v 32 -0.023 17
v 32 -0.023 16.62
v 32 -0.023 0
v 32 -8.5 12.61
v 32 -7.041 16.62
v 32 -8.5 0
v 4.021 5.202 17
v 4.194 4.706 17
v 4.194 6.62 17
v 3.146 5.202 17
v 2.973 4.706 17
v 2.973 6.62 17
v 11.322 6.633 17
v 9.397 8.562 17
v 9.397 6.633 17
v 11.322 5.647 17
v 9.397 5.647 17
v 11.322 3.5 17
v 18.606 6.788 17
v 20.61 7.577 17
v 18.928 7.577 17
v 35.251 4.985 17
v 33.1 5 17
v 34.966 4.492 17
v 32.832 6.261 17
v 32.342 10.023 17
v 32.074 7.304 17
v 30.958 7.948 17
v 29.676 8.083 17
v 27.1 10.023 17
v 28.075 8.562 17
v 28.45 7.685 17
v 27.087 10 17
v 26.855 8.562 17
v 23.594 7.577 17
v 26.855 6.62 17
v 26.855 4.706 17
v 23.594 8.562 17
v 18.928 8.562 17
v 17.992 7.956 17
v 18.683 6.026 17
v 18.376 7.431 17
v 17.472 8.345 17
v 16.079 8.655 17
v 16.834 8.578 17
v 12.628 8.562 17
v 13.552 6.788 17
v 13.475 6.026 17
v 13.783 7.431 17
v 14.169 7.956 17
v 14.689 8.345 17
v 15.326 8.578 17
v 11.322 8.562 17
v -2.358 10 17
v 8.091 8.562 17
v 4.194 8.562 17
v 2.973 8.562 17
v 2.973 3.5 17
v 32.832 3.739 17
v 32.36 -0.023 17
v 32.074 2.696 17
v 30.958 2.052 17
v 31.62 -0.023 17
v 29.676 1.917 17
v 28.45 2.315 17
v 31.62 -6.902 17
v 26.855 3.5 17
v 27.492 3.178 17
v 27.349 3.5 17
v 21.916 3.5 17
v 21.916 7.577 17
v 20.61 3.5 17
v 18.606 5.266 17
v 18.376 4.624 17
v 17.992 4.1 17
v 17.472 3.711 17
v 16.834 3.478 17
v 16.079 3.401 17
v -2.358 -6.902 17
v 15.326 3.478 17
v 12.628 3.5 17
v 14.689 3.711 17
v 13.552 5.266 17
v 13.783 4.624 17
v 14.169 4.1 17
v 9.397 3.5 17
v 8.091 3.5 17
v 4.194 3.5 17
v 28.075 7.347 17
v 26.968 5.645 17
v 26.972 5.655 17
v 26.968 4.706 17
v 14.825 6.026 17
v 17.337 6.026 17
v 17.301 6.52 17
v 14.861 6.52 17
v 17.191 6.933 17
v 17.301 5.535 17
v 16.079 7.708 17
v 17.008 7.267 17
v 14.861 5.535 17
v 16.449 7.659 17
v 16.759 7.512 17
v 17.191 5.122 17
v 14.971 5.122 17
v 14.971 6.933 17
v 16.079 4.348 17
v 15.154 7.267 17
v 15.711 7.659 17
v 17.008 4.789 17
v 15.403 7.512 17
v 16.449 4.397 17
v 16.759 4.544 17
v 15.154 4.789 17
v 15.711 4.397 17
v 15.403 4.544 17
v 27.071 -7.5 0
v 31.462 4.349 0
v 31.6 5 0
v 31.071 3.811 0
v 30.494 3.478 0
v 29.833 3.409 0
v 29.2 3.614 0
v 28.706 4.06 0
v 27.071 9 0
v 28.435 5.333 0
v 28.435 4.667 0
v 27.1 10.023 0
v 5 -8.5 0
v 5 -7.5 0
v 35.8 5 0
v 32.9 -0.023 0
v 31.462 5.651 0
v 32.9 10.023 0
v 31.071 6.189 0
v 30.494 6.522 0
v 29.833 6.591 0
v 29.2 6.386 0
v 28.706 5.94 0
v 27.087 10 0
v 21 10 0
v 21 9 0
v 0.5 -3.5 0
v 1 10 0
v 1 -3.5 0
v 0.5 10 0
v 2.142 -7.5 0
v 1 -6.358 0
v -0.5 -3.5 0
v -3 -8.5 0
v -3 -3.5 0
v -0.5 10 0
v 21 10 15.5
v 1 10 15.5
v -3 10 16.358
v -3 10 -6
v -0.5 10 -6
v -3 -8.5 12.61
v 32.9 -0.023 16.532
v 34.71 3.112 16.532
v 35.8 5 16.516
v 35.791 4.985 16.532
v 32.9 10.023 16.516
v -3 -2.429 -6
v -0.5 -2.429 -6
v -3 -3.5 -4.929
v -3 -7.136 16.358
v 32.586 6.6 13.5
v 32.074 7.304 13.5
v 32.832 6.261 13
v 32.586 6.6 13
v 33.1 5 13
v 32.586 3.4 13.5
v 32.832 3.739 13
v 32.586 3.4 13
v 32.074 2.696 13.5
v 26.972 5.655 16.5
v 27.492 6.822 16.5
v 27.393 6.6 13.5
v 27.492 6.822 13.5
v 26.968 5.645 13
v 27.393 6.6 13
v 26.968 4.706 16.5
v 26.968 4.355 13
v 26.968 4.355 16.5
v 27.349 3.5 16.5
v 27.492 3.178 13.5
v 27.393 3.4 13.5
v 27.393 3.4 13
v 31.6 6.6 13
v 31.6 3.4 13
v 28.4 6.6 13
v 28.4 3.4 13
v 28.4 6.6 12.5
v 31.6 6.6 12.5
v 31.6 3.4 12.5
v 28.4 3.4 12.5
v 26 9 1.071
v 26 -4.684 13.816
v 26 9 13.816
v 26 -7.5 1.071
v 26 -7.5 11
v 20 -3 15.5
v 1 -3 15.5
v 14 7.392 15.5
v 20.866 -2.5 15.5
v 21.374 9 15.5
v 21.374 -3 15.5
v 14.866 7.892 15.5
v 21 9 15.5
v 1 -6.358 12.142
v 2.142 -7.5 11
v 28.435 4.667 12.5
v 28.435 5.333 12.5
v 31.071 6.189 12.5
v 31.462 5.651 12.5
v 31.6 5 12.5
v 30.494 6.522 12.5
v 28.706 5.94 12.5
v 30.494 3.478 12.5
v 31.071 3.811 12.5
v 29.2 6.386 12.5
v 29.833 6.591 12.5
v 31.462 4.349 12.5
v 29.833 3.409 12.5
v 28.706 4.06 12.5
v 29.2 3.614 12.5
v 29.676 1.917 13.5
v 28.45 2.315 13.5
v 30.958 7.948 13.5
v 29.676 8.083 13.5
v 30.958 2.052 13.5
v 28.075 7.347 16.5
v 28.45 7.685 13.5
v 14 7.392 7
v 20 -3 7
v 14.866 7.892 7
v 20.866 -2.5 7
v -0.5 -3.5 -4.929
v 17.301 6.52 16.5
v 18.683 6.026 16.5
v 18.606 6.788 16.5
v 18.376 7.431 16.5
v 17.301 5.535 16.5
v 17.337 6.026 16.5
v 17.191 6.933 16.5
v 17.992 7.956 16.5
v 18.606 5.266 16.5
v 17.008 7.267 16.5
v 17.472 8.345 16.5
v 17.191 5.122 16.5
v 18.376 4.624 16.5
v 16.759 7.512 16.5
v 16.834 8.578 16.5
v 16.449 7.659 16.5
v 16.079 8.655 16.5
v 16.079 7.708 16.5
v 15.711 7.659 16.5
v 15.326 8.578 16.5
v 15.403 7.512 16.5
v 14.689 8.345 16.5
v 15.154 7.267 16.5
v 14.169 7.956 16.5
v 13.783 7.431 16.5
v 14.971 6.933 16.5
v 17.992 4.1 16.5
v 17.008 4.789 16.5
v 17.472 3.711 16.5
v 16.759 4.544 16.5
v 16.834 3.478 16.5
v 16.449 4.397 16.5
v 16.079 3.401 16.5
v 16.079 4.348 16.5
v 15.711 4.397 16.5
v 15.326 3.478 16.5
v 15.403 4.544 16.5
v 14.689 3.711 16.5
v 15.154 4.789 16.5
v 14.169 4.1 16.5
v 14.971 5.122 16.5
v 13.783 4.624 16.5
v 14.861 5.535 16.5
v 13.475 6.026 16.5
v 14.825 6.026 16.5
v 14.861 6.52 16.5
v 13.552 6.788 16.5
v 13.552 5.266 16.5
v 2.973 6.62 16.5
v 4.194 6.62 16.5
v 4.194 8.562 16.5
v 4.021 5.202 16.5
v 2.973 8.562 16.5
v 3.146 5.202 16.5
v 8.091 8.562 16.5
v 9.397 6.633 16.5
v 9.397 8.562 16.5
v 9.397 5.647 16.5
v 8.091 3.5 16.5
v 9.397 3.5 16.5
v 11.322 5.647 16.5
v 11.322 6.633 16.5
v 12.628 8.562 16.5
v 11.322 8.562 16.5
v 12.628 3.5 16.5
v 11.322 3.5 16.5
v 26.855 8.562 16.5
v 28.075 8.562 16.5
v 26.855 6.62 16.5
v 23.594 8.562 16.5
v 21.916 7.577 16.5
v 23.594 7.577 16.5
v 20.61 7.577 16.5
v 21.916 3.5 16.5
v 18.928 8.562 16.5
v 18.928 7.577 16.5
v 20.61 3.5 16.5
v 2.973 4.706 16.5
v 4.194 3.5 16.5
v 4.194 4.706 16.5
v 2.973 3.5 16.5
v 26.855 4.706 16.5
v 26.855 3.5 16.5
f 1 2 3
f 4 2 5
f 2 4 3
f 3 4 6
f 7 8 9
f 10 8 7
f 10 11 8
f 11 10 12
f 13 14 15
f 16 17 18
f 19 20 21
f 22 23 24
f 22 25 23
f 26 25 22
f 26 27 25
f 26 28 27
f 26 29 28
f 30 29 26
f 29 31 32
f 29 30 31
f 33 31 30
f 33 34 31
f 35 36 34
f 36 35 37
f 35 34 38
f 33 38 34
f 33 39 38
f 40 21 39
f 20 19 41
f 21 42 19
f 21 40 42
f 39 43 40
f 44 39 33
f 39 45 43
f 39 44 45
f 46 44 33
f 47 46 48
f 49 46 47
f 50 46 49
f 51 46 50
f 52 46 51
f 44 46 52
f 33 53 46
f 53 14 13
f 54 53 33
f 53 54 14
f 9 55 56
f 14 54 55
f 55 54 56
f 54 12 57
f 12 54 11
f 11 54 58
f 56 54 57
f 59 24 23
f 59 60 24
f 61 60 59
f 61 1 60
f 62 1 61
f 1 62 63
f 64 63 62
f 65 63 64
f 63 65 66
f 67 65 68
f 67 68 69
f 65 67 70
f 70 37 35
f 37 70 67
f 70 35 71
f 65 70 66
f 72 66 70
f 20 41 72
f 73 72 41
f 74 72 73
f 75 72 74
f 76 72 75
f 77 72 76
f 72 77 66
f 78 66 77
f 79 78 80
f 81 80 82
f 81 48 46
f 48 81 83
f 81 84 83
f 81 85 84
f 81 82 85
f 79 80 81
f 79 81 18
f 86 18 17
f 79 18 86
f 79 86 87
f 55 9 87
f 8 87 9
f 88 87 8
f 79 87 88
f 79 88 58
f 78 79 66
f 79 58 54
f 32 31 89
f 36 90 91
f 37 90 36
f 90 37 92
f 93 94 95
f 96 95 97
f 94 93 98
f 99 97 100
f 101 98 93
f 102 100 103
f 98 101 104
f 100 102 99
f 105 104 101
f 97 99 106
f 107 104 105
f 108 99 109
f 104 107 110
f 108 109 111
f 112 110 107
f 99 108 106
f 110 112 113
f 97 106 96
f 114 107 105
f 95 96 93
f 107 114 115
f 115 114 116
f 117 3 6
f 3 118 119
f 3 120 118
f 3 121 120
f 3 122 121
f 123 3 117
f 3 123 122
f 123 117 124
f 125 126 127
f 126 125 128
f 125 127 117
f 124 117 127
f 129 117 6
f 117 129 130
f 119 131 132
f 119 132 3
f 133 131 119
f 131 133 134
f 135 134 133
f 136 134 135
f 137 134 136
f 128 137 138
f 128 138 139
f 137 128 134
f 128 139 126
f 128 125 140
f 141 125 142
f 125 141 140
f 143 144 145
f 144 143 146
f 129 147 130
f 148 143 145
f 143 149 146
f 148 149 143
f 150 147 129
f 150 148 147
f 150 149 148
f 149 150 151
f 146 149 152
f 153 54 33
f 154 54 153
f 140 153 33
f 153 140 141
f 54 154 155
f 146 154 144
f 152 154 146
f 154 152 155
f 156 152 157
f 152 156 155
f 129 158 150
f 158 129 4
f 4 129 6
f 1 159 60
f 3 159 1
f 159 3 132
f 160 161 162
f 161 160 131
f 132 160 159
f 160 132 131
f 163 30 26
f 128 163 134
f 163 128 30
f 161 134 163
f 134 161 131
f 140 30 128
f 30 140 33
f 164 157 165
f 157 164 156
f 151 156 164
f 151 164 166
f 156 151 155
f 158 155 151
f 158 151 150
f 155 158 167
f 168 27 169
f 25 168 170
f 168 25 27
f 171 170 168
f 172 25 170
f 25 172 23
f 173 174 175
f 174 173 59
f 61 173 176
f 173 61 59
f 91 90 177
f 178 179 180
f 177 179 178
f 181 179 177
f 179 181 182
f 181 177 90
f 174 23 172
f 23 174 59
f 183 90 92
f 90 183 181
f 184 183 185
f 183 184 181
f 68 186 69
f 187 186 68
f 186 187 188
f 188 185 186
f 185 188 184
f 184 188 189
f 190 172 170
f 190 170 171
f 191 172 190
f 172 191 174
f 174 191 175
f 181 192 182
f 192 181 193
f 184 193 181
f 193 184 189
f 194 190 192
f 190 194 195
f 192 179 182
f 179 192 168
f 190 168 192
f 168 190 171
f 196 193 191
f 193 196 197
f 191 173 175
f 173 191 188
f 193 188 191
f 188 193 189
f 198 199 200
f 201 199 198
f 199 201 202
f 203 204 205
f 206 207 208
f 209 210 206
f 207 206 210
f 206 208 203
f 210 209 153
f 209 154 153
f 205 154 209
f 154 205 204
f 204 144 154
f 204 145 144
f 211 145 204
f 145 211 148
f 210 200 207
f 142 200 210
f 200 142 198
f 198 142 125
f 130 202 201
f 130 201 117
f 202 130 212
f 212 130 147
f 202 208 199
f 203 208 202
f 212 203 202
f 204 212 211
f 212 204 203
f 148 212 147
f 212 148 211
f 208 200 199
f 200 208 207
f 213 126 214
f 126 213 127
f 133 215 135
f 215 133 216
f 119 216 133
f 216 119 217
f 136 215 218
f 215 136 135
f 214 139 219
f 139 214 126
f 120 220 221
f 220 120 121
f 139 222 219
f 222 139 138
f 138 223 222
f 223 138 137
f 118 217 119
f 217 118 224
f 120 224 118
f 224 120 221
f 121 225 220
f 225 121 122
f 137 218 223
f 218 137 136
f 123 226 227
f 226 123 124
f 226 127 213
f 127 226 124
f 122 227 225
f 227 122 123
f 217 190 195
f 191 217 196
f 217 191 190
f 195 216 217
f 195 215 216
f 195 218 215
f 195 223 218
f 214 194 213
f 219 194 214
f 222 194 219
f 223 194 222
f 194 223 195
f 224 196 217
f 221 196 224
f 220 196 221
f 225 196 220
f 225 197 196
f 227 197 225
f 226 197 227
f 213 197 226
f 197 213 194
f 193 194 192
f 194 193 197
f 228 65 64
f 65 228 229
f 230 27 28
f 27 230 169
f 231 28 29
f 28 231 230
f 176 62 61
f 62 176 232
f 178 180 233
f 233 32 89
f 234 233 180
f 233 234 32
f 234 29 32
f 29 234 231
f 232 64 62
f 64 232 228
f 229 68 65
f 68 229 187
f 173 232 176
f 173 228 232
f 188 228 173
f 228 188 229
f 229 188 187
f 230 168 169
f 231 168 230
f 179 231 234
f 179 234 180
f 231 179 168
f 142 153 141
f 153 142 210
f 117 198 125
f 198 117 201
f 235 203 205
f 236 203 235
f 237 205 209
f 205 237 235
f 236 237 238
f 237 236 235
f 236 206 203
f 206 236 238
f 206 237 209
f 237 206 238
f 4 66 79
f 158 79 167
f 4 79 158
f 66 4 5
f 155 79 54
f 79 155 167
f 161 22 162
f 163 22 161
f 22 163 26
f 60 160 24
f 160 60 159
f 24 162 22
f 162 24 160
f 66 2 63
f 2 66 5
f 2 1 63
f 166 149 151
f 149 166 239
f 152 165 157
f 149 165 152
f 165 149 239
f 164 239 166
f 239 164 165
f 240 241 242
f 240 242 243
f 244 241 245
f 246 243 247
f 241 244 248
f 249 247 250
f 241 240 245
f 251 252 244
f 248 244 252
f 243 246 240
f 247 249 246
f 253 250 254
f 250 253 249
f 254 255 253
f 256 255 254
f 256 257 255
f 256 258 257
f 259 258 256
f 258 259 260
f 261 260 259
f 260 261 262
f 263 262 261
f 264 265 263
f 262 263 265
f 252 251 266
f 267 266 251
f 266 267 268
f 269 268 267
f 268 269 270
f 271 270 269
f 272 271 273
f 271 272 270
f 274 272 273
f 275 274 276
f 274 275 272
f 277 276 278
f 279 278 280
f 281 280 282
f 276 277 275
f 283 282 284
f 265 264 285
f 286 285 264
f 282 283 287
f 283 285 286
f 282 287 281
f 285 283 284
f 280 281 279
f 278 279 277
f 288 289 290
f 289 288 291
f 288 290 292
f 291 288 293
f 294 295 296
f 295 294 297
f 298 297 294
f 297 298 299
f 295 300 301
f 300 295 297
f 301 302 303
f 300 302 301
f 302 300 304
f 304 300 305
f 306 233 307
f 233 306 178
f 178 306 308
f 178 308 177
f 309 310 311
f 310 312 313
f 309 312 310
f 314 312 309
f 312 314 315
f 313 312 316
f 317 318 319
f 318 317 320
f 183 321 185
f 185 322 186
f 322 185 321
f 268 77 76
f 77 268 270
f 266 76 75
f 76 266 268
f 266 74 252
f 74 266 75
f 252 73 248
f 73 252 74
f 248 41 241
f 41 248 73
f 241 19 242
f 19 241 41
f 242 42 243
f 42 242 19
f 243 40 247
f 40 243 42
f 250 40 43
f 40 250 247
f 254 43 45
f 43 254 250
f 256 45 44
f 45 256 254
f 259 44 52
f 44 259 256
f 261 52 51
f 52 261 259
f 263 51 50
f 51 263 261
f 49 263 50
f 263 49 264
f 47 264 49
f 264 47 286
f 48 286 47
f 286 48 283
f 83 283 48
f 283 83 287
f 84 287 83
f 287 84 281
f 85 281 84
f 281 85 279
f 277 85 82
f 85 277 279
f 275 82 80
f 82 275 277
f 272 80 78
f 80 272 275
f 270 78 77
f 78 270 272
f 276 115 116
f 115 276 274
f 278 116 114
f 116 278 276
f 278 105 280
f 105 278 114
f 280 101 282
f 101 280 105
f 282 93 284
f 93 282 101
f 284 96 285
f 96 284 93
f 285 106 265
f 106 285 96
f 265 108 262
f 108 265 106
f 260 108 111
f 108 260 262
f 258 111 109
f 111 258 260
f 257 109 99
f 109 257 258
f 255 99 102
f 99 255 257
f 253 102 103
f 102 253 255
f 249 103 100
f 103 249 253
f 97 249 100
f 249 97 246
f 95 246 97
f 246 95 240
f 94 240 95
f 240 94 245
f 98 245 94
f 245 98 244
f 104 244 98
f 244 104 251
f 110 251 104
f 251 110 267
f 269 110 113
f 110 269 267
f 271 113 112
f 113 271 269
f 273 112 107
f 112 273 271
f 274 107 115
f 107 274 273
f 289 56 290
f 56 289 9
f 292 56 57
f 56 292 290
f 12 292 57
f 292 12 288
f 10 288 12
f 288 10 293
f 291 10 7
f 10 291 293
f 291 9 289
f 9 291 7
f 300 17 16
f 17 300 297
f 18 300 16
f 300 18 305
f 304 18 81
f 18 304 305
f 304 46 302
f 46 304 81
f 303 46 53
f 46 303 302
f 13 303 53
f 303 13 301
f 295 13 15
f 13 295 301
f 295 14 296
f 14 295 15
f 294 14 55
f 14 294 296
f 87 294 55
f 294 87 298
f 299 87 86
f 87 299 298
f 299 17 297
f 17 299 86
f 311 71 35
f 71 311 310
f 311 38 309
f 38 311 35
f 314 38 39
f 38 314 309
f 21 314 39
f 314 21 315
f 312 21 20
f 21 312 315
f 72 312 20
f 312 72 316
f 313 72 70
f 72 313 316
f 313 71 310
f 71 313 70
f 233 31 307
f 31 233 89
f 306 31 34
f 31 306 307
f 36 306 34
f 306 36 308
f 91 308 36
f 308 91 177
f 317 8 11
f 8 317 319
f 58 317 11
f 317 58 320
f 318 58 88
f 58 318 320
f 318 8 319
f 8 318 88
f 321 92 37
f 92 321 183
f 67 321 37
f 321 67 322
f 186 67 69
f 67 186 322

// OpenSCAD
// PRUSA iteration3
// Fan nozzle
// GNU GPL v3
// Josef Průša <iam@josefprusa.cz> and contributors
// http://www.reprap.org/wiki/Prusa_Mendel
// http://prusamendel.org

module fan_nozzle(){
    
    difference(){    
        union(){
        translate([0,-8.5,0])cube([32,10 + 8.5,17]); // Main cube
        translate([30,5,0])cylinder(r=5.8,h = 17, $fn=6);    
        translate([-3,-8.5,-6]) cube([3,10 + 8.5,23]);
        }

        // Mounting screw
        translate([30,5,-10])cylinder(r=3.2/2,h = 24.5-0.2, $fn=15); // Screw cut
        intersection(){
            translate([30,5,9])cylinder(r=3.1,h = 25, $fn=15); // head cut
            translate([30,5,17-3.5]) cube([6.2,3.2,1], center=true);
        }
        translate([30,5,17-4]) cube([3.2,3.2,1], center=true);
        translate([30,5,17-3.5])cylinder(r=3.1,h = 20, $fn=15); // head cut

        // Fan entry hole
        translate([1,10-1.5,-1])cube([20,3,16.5]);
        translate([1,10-1.5,-1-5])cube([18,3,16.5]);
            
        // Airway cutout
        difference(){    
            translate([1,1 - 8.5,-1])cube([25,8 + 8.5,16.5]);    
            translate([0,-8.5,10])rotate([45,0,0])cube([30,8,16.5]);    
            translate([-1,-10 - 8.5,-1])rotate([0,0,45])cube([10,8,30]); 
            translate([20,-8.5,16])rotate([0,20,0])cube([10,20,10]);    
        }

        translate([2,-1,-4.5])cube([24,3,5]);
        translate([22,-1-6.5,-2])rotate([0,45,0])cube([5,10 + 6.5,5]);
        
    }

    // Air director
    translate([20,-3,7])rotate([0,0,30])cube([1,12,10]);


}

module fancy_corners(){
    
    translate([-10,-10.5 - 8.5,13])rotate([-20,0,0])cube([50,10,15]);
    translate([-16,-10.5,17.5])rotate([0,45,0])cube([10,30,15]);
    
    translate([46.5,-10.5,15])rotate([0,-45,30])cube([10,30,15]);
    translate([28.62,-10.5,15])rotate([0,-45,-30])translate([0,10.5,0])cube([10,30,15]);
    translate([33.62,-10.5,15])rotate([0,-45,0])cube([10,10.477,15]);
    //translate([34.5,-1.5,15])rotate([0,-45,90])cube([10,2.477,15]);

    translate([-5,-1 - 8.5,-7])rotate([0,0,0]) cube([10,6,7]);
    translate([-0.5,-1 - 8.5,-7])rotate([0,0,0]) cube([1,20,7]);
    translate([-5,4 - 8.5,-11])rotate([45,0,0]) cube([10,5,5]);

    // //left cut
    // translate([-6.5,-8,-5])rotate([0,0,45])cube([10,10,45]);
    // translate([-7,-5,12])rotate([0,-45,0])cube([10,30,15]);
    
    // translate([-7,5,-10])rotate([0,0,45])cube([10,10,35]);
    
    }

module fan_n(){
    difference(){
        fan_nozzle();
        fancy_corners();    
        translate([2,3.5,16.5])linear_extrude(height = 0.6) {text("! HOT !", size = 5, font = "Helvetica Neue:style=Bold");}
    }
}

fan_n();
